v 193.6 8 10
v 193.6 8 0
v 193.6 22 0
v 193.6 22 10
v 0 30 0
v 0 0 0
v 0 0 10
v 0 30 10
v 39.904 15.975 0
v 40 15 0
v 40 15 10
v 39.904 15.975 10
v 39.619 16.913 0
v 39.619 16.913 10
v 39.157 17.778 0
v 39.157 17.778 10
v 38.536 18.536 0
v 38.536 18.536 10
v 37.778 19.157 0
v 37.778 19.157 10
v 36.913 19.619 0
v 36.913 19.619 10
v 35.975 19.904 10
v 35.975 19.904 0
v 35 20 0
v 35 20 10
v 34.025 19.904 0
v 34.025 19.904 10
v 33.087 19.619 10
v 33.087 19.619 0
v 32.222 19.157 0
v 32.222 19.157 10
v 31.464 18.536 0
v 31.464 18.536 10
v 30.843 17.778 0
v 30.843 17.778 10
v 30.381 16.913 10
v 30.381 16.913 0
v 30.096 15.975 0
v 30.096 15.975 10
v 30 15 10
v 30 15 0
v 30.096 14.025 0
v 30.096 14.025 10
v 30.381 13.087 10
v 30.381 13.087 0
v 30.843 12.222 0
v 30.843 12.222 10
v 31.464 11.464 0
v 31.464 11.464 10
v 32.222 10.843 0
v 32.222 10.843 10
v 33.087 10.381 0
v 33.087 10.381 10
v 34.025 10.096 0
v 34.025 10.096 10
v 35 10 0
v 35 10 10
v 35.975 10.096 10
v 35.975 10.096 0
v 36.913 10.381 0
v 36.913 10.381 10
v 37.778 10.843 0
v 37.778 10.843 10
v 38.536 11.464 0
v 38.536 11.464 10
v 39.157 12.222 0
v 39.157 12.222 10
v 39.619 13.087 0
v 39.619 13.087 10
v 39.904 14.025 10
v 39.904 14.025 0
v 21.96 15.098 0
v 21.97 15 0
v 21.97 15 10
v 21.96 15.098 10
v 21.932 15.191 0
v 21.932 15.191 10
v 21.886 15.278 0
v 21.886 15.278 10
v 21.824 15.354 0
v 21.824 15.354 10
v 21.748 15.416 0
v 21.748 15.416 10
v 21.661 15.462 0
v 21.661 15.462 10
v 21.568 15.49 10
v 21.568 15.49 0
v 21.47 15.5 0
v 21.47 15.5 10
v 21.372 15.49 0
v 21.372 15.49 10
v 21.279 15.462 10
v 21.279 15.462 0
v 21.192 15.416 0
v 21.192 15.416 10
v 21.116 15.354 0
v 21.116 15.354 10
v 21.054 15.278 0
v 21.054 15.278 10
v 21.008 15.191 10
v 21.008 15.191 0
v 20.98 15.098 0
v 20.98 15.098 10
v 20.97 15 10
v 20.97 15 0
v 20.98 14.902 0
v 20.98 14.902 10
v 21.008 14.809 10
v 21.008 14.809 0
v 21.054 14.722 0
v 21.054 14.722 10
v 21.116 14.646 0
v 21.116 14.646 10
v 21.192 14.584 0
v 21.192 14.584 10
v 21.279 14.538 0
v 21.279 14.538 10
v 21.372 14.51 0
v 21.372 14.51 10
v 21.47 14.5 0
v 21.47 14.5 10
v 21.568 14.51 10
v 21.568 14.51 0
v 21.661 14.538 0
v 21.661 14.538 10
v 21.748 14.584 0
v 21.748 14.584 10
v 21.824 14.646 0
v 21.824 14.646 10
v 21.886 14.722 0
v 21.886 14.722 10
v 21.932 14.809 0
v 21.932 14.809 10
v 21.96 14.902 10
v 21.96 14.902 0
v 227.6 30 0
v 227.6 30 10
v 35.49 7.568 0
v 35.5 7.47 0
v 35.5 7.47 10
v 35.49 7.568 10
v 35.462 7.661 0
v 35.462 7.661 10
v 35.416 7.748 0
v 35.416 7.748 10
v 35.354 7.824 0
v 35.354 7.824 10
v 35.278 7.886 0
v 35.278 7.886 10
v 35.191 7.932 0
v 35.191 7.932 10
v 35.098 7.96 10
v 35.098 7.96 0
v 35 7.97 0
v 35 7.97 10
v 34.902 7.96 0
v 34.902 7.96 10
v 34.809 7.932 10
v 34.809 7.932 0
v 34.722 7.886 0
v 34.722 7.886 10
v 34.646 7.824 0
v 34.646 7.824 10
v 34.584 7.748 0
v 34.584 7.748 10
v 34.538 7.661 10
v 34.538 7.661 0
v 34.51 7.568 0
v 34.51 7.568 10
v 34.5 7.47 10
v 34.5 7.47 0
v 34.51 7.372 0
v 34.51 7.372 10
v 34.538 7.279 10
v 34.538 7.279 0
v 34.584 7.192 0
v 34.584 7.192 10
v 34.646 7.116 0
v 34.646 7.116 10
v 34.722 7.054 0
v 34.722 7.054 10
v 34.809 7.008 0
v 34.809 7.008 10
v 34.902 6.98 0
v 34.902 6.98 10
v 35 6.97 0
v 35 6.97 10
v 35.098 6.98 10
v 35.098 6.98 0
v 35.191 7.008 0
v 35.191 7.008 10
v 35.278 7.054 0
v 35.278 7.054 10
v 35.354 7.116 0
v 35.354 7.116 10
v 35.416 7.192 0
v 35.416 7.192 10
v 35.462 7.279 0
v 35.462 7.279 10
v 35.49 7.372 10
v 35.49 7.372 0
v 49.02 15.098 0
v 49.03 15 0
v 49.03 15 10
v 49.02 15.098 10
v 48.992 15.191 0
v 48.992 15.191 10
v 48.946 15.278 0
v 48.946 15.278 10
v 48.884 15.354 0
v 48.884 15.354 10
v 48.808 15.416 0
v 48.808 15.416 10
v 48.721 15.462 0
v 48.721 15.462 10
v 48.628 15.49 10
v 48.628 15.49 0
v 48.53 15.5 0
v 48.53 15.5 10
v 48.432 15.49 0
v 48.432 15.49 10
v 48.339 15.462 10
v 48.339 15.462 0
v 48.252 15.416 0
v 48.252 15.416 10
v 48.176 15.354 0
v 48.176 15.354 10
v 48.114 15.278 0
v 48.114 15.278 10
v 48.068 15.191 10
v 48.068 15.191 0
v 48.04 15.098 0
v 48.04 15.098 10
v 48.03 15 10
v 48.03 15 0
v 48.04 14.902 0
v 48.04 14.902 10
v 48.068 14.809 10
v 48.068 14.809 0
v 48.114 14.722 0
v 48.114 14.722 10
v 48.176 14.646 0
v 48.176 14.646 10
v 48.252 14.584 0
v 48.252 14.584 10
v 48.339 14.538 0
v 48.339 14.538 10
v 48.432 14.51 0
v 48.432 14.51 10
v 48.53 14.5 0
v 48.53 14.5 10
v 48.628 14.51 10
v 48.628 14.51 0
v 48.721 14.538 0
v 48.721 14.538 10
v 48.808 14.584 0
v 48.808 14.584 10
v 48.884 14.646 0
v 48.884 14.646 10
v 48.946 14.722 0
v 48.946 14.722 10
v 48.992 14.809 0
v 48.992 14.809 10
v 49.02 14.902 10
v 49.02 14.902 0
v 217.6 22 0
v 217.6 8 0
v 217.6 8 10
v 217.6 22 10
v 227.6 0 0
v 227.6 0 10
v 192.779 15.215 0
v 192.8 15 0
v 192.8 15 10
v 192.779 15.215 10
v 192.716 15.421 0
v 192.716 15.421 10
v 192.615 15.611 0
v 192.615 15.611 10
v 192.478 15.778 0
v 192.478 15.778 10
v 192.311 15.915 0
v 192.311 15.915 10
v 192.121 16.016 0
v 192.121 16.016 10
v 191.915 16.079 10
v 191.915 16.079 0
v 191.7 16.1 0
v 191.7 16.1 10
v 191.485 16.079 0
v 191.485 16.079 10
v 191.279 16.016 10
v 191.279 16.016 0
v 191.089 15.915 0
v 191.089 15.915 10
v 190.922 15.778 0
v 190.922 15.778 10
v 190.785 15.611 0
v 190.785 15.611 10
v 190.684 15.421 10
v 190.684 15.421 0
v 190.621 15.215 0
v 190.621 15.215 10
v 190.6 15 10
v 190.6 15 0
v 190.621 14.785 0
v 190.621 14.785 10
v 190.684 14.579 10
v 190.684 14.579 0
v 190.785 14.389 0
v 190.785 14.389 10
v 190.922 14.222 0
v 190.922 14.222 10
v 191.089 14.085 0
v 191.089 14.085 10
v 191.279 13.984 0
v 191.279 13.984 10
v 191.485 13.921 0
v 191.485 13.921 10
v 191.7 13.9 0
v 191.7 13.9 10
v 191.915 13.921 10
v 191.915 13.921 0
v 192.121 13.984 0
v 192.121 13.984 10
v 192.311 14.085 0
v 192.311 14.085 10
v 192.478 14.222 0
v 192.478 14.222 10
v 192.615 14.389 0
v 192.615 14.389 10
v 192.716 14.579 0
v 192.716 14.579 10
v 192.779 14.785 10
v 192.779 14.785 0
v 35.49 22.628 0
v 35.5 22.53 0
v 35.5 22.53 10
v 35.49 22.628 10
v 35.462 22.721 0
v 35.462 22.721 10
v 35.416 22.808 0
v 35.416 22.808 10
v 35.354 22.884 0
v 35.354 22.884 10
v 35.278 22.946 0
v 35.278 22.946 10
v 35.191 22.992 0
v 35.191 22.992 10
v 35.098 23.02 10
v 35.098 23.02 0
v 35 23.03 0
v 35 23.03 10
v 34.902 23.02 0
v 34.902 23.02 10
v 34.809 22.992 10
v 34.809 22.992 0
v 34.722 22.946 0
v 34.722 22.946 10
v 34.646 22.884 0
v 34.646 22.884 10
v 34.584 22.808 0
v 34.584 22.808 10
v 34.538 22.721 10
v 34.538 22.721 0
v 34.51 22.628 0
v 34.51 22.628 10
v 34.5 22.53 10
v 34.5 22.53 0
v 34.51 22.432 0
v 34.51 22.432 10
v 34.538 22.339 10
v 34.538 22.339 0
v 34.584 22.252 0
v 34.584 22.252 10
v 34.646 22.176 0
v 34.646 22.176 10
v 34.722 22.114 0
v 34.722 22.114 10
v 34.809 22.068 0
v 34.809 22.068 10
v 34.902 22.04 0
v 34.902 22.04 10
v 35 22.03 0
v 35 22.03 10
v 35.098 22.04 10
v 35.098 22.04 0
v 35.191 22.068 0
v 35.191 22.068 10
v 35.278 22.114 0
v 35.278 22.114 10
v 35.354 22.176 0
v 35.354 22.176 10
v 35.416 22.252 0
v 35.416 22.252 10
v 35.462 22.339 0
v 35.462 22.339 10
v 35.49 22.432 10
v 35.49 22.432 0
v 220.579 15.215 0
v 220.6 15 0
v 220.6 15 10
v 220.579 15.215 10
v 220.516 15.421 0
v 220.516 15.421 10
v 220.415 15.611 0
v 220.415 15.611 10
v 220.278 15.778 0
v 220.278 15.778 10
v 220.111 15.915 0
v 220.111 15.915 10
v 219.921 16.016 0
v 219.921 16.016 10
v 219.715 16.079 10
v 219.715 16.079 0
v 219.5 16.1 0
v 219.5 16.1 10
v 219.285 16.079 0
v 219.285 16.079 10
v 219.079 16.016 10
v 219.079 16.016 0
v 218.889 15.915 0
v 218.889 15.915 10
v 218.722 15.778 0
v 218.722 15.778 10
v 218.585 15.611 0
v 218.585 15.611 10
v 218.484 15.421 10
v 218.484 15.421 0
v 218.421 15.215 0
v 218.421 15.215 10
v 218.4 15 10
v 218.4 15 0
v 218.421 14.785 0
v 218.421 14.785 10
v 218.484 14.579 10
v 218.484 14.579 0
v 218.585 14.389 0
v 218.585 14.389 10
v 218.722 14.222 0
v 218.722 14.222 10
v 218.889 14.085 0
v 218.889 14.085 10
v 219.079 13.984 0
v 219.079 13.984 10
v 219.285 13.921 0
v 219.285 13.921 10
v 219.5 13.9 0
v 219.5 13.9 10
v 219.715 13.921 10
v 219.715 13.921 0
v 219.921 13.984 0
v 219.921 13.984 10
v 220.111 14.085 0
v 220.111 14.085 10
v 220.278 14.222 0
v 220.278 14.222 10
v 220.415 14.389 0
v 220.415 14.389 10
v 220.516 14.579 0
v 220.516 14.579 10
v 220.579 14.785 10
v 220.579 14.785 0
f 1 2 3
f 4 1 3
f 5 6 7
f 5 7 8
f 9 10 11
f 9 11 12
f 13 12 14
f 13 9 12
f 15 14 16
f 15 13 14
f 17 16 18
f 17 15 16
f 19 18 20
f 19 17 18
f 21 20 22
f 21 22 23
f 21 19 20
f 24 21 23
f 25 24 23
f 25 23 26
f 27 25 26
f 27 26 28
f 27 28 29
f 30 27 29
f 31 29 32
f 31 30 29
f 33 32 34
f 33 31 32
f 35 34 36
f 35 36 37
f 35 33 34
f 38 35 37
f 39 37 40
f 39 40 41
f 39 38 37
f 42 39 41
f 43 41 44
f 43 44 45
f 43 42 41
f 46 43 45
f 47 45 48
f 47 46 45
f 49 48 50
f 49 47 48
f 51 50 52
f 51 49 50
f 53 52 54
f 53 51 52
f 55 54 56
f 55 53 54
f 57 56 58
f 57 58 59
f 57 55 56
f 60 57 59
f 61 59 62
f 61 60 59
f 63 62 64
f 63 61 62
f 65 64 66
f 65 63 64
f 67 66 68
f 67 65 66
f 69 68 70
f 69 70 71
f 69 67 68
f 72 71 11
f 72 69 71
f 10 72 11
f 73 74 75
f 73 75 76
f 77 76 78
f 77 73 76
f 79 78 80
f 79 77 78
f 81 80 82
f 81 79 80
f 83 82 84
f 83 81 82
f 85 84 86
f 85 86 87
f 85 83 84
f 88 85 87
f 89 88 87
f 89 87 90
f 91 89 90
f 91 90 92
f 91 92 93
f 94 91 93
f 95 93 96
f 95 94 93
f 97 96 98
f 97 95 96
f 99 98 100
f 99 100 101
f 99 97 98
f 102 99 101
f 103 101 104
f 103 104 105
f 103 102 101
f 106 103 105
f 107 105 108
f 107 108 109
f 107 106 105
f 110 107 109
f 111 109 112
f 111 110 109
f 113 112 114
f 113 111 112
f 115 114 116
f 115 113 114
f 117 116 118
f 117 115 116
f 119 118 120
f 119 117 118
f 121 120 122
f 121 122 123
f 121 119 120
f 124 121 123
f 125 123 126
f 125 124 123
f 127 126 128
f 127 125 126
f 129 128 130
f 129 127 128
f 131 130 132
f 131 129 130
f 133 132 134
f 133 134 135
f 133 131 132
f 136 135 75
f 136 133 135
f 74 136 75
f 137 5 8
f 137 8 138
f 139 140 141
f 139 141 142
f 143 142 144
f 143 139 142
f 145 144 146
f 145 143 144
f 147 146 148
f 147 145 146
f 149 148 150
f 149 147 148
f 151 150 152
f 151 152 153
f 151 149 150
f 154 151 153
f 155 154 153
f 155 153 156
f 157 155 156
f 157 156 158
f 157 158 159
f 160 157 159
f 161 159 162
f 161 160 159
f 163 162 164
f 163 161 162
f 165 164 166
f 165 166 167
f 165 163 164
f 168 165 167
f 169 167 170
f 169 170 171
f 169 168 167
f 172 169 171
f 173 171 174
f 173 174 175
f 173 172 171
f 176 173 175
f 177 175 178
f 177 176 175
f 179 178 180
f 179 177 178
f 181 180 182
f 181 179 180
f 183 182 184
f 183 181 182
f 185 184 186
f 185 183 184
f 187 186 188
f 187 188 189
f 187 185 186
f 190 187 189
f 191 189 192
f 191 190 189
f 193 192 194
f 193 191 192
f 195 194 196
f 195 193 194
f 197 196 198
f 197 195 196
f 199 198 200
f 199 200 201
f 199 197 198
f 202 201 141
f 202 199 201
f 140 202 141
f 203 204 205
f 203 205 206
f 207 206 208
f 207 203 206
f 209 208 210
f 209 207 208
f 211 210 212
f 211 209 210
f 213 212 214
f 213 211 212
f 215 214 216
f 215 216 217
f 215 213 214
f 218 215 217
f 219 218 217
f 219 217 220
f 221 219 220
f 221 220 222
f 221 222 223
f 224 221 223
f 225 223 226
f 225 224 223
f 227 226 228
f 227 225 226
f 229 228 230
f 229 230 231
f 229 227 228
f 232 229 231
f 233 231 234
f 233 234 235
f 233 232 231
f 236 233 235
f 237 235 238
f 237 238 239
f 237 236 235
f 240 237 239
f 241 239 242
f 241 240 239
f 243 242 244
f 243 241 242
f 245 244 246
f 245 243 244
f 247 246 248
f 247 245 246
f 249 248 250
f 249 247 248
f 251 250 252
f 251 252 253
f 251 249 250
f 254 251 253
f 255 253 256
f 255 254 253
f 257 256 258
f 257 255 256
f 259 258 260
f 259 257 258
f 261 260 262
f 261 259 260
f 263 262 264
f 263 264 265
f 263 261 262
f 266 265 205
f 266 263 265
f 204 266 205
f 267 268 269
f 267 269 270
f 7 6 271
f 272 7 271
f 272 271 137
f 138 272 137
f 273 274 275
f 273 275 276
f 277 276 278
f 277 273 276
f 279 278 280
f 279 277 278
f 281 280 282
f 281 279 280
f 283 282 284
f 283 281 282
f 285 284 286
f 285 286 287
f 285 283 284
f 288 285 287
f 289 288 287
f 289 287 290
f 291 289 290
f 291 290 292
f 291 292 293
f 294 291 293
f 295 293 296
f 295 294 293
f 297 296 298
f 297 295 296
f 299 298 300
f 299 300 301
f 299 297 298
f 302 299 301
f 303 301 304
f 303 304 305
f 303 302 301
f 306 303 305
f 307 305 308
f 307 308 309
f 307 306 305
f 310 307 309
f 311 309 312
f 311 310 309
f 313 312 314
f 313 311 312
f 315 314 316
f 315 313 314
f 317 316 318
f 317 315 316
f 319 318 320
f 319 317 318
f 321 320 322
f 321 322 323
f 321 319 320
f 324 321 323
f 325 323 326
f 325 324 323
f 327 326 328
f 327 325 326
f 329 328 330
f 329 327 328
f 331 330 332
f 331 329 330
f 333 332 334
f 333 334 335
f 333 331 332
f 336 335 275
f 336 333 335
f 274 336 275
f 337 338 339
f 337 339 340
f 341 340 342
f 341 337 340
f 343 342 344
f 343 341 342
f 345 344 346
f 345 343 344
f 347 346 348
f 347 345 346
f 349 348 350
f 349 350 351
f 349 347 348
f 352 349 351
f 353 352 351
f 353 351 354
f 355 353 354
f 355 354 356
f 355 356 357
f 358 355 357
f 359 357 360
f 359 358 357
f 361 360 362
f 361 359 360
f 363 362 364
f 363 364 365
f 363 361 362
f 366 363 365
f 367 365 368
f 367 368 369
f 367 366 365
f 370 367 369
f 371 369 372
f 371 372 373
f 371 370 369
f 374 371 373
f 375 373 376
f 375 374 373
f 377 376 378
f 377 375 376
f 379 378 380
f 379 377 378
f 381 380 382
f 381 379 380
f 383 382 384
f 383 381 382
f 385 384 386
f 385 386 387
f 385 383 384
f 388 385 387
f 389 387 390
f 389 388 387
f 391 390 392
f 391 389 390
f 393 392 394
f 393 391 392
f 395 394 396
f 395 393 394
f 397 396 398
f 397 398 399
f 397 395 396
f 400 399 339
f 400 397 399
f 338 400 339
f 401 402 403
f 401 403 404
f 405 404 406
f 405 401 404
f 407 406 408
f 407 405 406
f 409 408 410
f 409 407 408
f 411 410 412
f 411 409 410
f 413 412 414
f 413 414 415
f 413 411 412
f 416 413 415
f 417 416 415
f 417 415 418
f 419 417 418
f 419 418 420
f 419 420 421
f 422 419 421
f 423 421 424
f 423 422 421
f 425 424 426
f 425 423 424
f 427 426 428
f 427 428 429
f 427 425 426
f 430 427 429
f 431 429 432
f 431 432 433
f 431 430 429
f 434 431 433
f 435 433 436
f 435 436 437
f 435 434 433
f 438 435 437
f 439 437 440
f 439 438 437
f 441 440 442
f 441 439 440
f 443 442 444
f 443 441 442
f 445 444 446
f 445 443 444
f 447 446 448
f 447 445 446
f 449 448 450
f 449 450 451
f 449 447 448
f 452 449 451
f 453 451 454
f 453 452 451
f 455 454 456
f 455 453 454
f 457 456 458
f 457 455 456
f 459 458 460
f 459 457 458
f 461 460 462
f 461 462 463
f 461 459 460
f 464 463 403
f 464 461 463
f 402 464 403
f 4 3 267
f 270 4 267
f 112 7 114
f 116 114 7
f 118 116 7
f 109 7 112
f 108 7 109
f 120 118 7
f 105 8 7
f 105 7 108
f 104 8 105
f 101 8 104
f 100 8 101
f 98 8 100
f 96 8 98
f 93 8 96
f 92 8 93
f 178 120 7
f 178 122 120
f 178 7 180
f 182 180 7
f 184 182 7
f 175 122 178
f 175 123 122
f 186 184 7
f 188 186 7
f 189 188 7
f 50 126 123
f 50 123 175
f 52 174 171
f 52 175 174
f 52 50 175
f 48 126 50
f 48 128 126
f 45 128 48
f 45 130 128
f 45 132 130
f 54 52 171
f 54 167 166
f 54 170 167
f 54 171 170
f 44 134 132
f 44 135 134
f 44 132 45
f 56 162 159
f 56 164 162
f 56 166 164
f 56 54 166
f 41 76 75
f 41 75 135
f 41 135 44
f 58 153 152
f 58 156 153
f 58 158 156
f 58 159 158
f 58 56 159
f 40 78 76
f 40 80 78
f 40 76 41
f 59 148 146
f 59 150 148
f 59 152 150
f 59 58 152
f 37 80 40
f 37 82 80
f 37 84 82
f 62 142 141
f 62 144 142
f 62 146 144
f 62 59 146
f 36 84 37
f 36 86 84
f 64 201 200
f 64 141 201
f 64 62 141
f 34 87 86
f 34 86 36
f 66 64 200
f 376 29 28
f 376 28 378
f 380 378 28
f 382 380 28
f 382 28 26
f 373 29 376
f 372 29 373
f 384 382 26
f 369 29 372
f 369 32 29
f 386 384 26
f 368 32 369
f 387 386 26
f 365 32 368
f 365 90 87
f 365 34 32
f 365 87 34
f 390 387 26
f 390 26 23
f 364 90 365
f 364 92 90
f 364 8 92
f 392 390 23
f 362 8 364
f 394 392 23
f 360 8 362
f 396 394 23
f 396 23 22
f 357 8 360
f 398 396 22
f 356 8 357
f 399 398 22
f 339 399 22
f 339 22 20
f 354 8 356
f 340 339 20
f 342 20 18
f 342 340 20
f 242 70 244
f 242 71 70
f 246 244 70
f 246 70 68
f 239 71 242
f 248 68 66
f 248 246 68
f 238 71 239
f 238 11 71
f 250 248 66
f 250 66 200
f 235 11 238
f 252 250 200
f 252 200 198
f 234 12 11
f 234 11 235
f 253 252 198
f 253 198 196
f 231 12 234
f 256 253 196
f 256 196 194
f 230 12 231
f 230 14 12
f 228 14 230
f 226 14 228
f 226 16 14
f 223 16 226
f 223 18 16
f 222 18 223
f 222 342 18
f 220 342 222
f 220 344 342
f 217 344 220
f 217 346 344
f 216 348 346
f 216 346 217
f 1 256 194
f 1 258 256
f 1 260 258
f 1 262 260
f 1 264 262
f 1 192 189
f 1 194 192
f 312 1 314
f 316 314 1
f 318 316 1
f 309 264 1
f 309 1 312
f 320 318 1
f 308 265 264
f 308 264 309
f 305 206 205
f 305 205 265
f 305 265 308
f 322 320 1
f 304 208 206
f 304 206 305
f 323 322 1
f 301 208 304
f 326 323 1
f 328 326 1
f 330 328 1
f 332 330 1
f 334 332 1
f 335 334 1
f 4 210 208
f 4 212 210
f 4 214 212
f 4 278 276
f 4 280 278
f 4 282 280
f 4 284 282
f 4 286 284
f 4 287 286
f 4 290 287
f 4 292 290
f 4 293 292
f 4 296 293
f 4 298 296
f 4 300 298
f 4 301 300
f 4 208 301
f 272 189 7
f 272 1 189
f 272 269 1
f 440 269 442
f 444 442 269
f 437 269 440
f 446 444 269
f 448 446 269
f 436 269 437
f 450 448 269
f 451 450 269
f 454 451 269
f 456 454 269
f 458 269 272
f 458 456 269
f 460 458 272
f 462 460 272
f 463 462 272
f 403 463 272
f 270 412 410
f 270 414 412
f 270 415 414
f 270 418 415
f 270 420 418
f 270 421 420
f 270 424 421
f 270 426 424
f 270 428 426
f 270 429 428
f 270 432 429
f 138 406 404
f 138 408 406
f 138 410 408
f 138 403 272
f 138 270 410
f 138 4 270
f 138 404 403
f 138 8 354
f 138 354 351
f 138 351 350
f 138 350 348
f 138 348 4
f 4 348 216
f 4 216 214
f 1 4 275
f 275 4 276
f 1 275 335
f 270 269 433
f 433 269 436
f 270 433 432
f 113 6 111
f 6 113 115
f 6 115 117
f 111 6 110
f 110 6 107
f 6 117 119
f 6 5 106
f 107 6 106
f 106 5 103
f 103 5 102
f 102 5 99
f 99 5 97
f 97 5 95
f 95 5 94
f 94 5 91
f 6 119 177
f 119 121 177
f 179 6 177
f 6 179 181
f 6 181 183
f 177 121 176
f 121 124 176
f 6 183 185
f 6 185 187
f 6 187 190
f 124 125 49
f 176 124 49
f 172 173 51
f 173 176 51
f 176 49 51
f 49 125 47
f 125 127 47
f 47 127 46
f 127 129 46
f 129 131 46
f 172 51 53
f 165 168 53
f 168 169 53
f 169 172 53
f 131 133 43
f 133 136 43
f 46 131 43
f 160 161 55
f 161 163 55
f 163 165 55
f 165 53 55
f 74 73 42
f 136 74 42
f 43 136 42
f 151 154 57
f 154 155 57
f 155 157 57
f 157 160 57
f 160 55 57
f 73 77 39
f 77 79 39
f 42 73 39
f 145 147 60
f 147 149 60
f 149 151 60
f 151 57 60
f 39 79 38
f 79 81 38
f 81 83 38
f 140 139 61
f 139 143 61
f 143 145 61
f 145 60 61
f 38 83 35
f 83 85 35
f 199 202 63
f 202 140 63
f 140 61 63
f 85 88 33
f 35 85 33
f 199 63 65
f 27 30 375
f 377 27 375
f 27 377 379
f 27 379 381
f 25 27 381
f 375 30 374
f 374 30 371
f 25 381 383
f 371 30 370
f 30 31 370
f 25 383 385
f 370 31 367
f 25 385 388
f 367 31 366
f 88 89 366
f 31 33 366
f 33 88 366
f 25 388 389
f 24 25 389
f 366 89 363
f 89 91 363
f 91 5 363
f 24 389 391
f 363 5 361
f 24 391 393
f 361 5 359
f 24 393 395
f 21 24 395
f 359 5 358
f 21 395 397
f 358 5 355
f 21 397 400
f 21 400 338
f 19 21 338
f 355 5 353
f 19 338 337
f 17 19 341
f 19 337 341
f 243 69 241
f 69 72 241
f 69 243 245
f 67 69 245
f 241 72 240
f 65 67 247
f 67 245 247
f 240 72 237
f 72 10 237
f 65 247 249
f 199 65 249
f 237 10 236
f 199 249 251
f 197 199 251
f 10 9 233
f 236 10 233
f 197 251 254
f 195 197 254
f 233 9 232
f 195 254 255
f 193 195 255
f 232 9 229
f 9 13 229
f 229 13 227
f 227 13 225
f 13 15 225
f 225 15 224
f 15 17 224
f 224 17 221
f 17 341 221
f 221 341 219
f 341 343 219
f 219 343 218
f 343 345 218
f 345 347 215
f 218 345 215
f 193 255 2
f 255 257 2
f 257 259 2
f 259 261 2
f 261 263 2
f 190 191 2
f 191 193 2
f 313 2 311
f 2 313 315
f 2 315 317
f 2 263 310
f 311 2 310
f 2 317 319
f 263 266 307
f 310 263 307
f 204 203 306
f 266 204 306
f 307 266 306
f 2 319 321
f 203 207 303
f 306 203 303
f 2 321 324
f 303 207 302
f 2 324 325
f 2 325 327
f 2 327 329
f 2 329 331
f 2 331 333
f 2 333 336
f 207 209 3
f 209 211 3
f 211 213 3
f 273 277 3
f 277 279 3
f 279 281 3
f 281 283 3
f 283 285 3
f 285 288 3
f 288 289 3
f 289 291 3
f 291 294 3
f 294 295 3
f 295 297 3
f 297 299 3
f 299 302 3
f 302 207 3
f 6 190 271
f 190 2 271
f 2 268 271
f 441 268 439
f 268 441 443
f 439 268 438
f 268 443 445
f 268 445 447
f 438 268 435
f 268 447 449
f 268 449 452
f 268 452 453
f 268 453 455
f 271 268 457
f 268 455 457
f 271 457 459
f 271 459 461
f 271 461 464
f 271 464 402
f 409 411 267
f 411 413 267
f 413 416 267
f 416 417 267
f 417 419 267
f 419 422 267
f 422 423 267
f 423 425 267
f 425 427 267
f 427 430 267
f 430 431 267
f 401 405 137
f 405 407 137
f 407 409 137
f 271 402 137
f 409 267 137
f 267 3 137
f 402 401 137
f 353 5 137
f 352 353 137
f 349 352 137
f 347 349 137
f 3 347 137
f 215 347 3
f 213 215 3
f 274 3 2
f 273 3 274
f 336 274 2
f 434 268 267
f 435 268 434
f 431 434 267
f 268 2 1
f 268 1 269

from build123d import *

# Parameters (mm, degrees)
SKETCH1_W           = 227.6
SKETCH1_H           = 30
SKETCH1_R           = 0.5
SKETCH1_R_2         = 5
SKETCH1_R_3         = 1.1
SKETCH1_W_2         = 24
SKETCH1_H_2         = 14
BOSS_EXTRUDE1_DEPTH = 10


with BuildPart() as part:
    # Sketch1 → Boss-Extrude1 (new body)
    with BuildSketch(Plane.XY):
        with Locations((113.8, 15)):
            Rectangle(SKETCH1_W, SKETCH1_H)
        with Locations((35, 7.47)):
            Circle(SKETCH1_R, mode=Mode.SUBTRACT)
        with Locations((21.47, 15)):
            Circle(SKETCH1_R, mode=Mode.SUBTRACT)
        with Locations((35, 15)):
            Circle(SKETCH1_R_2, mode=Mode.SUBTRACT)
        with Locations((48.53, 15)):
            Circle(SKETCH1_R, mode=Mode.SUBTRACT)
        with Locations((35, 22.53)):
            Circle(SKETCH1_R, mode=Mode.SUBTRACT)
        with Locations((219.5, 15)):
            Circle(SKETCH1_R_3, mode=Mode.SUBTRACT)
        with Locations((191.7, 15)):
            Circle(SKETCH1_R_3, mode=Mode.SUBTRACT)
        with Locations((205.6, 15)):
            Rectangle(SKETCH1_W_2, SKETCH1_H_2, mode=Mode.SUBTRACT)
    extrude(amount=BOSS_EXTRUDE1_DEPTH)


solid = part.part
